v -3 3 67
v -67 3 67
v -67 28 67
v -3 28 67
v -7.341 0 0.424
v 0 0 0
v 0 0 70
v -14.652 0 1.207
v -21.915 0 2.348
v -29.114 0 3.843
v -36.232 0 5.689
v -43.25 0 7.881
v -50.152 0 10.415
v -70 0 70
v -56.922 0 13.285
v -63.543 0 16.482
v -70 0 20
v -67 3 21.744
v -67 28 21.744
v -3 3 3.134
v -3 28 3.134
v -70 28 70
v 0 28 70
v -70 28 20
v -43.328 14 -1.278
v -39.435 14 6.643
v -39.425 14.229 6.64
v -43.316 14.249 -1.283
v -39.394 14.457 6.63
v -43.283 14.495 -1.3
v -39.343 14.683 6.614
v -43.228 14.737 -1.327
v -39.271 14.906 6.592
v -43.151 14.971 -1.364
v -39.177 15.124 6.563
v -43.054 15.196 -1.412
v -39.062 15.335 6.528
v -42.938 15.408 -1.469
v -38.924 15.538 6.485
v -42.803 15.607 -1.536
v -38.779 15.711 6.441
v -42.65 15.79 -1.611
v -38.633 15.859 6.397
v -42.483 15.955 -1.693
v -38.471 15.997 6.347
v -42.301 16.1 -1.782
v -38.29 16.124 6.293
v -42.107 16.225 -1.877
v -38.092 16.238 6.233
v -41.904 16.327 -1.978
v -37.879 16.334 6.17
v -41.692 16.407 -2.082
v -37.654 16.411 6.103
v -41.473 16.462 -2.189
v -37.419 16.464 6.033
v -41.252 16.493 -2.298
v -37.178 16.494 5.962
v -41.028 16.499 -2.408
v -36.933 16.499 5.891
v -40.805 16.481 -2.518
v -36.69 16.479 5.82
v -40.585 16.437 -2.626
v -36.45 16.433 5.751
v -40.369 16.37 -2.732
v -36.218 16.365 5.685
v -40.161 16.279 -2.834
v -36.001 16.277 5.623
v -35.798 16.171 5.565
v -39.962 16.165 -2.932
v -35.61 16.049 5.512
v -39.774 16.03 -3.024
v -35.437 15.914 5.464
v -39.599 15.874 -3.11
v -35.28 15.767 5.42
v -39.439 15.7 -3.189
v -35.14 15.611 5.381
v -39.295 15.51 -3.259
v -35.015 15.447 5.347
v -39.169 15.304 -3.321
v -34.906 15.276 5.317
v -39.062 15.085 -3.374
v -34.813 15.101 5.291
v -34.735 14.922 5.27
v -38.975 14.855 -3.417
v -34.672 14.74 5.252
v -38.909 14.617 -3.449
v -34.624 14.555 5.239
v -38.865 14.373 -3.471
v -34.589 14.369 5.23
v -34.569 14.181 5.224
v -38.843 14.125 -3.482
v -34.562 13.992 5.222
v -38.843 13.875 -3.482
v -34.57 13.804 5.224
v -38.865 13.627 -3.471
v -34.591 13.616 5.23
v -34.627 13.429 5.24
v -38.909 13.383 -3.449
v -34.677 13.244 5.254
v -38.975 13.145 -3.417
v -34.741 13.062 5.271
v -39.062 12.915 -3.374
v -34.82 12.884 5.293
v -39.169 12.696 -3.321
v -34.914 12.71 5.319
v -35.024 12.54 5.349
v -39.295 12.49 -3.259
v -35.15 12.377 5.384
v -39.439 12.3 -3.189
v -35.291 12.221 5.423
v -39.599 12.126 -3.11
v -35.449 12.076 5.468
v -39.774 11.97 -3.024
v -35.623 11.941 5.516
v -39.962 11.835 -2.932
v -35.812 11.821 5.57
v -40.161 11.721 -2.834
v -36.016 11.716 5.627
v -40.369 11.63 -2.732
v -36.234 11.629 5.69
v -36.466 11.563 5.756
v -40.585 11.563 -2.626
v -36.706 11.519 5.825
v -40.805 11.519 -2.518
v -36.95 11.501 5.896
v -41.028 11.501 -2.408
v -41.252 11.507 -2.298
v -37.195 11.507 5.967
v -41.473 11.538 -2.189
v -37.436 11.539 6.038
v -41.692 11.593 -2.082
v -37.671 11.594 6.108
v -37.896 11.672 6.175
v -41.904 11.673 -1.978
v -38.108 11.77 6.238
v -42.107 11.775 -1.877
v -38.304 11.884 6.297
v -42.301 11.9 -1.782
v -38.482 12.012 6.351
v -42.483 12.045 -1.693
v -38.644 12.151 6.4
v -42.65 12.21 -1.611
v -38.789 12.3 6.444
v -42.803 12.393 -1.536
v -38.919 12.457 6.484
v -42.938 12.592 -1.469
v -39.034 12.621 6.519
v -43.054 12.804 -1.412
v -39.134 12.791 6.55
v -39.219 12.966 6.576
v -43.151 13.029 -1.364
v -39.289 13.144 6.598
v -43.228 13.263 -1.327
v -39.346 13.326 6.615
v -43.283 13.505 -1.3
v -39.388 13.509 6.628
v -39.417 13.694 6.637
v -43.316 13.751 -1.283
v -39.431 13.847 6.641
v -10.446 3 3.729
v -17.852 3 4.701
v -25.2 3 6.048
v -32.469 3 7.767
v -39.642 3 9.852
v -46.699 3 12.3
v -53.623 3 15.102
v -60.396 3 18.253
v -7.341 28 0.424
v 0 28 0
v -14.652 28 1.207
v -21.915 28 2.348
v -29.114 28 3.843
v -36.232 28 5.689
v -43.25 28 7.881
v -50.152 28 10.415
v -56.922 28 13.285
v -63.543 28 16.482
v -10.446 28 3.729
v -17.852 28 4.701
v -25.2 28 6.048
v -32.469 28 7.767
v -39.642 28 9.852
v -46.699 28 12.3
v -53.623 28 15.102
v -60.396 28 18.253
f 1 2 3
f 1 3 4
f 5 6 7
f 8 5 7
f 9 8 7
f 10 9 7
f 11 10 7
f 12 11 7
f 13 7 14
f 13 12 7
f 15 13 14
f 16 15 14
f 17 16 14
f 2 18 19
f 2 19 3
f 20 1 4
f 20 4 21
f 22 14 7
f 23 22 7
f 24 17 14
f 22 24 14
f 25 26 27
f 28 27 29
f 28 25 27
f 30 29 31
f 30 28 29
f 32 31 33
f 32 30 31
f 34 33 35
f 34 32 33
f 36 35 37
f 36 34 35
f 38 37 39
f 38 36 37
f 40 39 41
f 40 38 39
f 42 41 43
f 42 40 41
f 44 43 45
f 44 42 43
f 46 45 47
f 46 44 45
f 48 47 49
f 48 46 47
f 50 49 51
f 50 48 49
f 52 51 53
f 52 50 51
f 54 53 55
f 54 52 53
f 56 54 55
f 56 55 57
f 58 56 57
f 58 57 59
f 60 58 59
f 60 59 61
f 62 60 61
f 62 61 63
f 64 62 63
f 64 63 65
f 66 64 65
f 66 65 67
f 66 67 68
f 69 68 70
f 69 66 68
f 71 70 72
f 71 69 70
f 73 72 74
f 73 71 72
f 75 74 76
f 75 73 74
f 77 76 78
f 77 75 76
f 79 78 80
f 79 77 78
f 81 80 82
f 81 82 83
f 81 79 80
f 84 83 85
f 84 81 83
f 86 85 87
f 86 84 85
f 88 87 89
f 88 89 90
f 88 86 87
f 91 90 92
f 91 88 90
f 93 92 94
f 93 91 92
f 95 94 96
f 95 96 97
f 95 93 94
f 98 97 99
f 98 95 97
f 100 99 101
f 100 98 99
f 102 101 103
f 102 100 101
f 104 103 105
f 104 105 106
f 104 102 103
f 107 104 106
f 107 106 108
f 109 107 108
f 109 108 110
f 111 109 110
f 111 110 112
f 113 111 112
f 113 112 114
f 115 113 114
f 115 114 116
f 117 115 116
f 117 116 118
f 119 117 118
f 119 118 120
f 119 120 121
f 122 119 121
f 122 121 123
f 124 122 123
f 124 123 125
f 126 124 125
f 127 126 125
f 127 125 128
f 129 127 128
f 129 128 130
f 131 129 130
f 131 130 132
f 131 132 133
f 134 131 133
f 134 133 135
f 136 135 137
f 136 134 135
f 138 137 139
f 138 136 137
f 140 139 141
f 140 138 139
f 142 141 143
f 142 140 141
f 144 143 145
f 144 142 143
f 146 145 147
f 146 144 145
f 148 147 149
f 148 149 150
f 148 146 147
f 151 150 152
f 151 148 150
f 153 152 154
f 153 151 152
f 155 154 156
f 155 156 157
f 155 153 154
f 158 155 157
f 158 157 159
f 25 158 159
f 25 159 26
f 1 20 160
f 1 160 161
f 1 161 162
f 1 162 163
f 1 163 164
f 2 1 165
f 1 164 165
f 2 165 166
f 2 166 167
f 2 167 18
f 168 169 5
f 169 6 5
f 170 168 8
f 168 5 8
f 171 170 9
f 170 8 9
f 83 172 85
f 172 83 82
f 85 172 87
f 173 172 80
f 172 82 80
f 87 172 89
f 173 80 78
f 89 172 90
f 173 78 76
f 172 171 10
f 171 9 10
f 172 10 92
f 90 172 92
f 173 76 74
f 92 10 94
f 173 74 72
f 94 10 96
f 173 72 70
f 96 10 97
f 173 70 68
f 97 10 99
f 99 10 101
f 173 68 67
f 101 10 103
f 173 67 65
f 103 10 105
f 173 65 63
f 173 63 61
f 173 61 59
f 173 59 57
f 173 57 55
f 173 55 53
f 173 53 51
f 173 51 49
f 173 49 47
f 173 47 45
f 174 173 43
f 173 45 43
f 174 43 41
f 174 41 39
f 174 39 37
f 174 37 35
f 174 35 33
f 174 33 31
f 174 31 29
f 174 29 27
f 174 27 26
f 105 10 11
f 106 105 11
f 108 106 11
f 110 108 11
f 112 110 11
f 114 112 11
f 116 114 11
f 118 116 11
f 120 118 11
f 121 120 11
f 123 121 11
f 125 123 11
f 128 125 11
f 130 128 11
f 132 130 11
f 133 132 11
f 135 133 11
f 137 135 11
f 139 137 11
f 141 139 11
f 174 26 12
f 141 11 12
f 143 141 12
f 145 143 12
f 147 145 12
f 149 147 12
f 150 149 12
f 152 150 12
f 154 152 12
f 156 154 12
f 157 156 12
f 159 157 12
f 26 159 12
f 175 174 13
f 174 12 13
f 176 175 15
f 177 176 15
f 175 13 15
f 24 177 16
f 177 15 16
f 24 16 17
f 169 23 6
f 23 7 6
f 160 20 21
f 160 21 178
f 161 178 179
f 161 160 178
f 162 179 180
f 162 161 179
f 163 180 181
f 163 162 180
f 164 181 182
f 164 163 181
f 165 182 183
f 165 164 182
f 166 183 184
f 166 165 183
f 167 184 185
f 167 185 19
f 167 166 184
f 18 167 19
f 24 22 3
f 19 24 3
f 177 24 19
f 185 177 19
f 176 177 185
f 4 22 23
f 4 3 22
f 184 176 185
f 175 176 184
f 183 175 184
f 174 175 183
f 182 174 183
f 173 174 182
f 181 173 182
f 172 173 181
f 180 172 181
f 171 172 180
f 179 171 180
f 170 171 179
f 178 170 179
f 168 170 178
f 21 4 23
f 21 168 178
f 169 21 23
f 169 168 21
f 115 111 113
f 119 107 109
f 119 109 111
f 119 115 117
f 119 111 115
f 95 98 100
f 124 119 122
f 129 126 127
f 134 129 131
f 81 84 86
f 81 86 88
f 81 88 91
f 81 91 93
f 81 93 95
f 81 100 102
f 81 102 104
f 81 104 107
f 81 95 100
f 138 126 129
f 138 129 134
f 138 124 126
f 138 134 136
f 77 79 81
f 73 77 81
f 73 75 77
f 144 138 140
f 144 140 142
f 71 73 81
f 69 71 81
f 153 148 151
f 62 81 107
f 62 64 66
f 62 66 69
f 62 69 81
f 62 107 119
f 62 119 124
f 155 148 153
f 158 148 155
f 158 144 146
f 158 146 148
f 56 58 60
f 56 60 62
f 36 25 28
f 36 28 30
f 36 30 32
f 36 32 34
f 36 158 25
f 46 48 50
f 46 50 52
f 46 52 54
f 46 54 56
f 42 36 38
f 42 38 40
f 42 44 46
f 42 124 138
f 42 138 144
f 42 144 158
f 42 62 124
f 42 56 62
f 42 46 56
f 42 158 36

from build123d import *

# Parameters (mm, degrees)
BOSS_EXTRUDE1_DEPTH             = 3
BOSS_EXTRUDE2_DEPTH             = 25
SKETCH4_R                       = 2.5
BOSS_EXTRUDE3_DEPTH             = 7
BOSS_EXTRUDE3_DIRECTION_2_REACH = 85.256


with BuildPart() as part:
    # Sketch1 → Boss-Extrude1 (new body)
    with BuildSketch(Plane(origin=(0, 0, 0), x_dir=(1, 0, 0), z_dir=(0, 1, 0))):
        with BuildLine():
            Line((0, 0), (0, -70))
            Line((0, -70), (-70, -70))
            Line((-70, -70), (-70, -20))
            ThreePointArc((-70, -20), (-36.231761047, -5.688836334), (0, 0))
        make_face()
    extrude(amount=BOSS_EXTRUDE1_DEPTH)

    # Sketch2 → Boss-Extrude2 (add)
    with BuildSketch(Plane(origin=(0, 3, 0), x_dir=(1, 0, 0), z_dir=(0, 1, 0))):
        with BuildLine():
            Line((-70, -70), (0, -70))
            Line((0, -70), (0, 0))
            ThreePointArc((0, 0), (-36.231761047, -5.688836334), (-70, -20))
            Line((-70, -20), (-70, -70))
        make_face()
        with BuildLine():
            Line((-67, -21.744121307), (-67, -67))
            Line((-67, -67), (-3, -67))
            Line((-3, -67), (-3, -3.133993062))
            ThreePointArc((-3, -3.133993062), (-36.068657655, -8.763956776), (-67, -21.744121307))
        make_face(mode=Mode.SUBTRACT)
    extrude(amount=BOSS_EXTRUDE2_DEPTH)

    # Sketch4 → Boss-Extrude3 (add)
    with BuildSketch(Plane(origin=(-61.178699811, 14, 15.293872991), x_dir=(-0.8974903699241336, 0, 0.4410340529862088), z_dir=(-0.4410340529862088, 0, -0.8974903699241336))):
        with Locations((-25.829909239, 0)):
            Circle(SKETCH4_R)
    extrude(amount=BOSS_EXTRUDE3_DEPTH)

    # Sketch4 → Boss-Extrude3 direction 2 (add, up to next)
    with BuildSketch(Plane(origin=(-61.178699811, 14, 15.293872991), x_dir=(-0.8974903699241336, 0, 0.4410340529862088), z_dir=(-0.4410340529862088, 0, -0.8974903699241336)), mode=Mode.PRIVATE) as boss_extrude3_direction_2_sk1:
        with Locations((-25.829909239, 0)):
            Circle(SKETCH4_R)
    boss_extrude3_direction_2_tool1 = extrude(boss_extrude3_direction_2_sk1.sketch, amount=-BOSS_EXTRUDE3_DIRECTION_2_REACH, mode=Mode.PRIVATE) - part.part
    add(boss_extrude3_direction_2_tool1.solids().sort_by_distance((-37.996605, 14, 3.902003))[0])


solid = part.part
